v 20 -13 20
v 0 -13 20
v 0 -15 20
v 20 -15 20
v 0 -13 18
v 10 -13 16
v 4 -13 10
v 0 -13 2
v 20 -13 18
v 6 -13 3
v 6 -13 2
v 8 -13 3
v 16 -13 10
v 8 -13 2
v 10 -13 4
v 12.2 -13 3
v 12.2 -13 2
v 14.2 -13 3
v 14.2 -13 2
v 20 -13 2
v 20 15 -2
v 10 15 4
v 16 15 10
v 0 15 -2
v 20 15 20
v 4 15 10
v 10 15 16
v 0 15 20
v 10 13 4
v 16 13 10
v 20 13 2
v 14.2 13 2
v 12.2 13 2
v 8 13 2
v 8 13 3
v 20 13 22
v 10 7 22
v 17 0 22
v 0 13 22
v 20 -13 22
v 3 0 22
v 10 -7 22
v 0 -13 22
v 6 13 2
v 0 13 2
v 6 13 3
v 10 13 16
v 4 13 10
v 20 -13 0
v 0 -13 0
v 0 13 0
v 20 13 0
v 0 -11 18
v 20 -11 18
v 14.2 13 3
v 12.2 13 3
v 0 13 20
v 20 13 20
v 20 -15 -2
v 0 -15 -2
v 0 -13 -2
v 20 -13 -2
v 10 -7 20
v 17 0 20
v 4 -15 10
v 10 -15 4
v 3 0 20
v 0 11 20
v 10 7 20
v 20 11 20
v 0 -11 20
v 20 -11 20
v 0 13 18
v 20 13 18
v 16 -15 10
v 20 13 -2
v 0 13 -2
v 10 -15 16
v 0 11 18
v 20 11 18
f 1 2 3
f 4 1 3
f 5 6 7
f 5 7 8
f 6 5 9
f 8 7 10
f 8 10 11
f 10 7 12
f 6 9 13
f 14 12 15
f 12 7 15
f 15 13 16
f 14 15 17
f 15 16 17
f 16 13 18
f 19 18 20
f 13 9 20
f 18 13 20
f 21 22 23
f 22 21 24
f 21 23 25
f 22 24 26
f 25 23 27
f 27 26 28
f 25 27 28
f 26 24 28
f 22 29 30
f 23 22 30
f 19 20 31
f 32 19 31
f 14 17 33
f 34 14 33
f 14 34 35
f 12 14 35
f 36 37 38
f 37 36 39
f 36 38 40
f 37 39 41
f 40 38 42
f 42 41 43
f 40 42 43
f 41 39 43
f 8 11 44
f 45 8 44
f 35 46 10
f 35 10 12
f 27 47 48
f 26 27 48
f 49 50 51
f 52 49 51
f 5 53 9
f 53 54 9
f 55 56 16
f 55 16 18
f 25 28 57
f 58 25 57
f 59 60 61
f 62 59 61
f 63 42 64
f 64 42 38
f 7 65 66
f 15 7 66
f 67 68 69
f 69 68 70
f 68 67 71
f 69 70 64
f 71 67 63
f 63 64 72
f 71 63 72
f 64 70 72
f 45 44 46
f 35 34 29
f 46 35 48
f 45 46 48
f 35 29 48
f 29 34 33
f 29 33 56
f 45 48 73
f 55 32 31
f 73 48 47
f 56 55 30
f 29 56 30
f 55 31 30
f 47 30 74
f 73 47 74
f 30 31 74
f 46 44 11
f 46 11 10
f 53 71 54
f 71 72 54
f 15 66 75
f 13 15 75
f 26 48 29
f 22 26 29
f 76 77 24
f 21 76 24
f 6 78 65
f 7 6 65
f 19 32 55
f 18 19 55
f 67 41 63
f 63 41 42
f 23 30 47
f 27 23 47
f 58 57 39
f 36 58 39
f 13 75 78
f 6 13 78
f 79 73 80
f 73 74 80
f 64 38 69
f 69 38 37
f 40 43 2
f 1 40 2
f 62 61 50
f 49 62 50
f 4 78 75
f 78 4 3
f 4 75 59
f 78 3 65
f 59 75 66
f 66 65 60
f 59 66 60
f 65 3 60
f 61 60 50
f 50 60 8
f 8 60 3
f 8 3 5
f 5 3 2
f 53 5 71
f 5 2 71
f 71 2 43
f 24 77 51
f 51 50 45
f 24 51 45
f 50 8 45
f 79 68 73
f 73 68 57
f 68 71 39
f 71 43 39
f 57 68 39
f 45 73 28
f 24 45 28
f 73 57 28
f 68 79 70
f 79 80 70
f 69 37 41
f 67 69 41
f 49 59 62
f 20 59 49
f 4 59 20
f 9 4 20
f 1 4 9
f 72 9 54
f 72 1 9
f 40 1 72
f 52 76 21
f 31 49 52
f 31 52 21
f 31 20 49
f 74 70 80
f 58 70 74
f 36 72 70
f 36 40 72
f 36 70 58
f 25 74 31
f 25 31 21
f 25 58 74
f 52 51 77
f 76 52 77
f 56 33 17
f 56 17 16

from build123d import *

# Parameters (mm, degrees)
F1_DEPTH = 20
F2_T     = -2
F3_W     = 2
F3_H     = 1
F4_DEPTH = 26
F6_DEPTH = 30.001
F8_DEPTH = 2


# Not quite as in the source:
# - a shell that OpenCascade refuses in one call is made with other operations: the cavity is built on its own and cut out


with BuildPart() as f1:
    # F0 (on Right) → F1 (new body)
    with BuildSketch(Plane.YZ):
        Polygon((-13, -2), (-13, 0), (13, 0), (13, -2), (15, -2), (15, 20), (13, 20), (13, 22), (-13, 22), (-13, 20), (-15, 20), (-15, -2), align=None)
    extrude(amount=F1_DEPTH)

    # F2: a shell. OpenCascade refuses it in one call, so the cavity is built on its own and cut out:
    # the body offset inwards by the wall thickness, plus a prism from it out through each open face.
    f2_core = offset(f1.part, amount=F2_T, kind=Kind.INTERSECTION, mode=Mode.PRIVATE)
    f2_exits = [f2_core.faces().sort_by_distance(p)[0] for p in [
        (2, 0, 10.86087),
        (18, 0, 10.86087),
    ]]
    add(f2_core, mode=Mode.SUBTRACT)
    extrude(f2_exits, amount=-F2_T, mode=Mode.SUBTRACT)

    # F3 (on face) → F4 (join, through all)
    with BuildSketch(Plane.XZ.offset(-13)):
        with Locations((7, 2.5)):
            Rectangle(F3_W, F3_H)
        with Locations((13.2, 2.5)):
            Rectangle(F3_W, F3_H)
    extrude(amount=F4_DEPTH)

    # F5 (on face) → F6 (cut, through all)
    with BuildSketch(Plane.XZ.offset(15)):
        Polygon((16, 10), (10, 16), (4, 10), (10, 4), align=None)
    extrude(amount=-F6_DEPTH, mode=Mode.SUBTRACT)

    # F7 (on face) → F8 (cut, through all)
    with BuildSketch(Plane.XY.offset(22)):
        Polygon((17, 0), (10, 7), (3, 0), (10, -7), align=None)
    extrude(amount=-F8_DEPTH, mode=Mode.SUBTRACT)


solid = f1.part
